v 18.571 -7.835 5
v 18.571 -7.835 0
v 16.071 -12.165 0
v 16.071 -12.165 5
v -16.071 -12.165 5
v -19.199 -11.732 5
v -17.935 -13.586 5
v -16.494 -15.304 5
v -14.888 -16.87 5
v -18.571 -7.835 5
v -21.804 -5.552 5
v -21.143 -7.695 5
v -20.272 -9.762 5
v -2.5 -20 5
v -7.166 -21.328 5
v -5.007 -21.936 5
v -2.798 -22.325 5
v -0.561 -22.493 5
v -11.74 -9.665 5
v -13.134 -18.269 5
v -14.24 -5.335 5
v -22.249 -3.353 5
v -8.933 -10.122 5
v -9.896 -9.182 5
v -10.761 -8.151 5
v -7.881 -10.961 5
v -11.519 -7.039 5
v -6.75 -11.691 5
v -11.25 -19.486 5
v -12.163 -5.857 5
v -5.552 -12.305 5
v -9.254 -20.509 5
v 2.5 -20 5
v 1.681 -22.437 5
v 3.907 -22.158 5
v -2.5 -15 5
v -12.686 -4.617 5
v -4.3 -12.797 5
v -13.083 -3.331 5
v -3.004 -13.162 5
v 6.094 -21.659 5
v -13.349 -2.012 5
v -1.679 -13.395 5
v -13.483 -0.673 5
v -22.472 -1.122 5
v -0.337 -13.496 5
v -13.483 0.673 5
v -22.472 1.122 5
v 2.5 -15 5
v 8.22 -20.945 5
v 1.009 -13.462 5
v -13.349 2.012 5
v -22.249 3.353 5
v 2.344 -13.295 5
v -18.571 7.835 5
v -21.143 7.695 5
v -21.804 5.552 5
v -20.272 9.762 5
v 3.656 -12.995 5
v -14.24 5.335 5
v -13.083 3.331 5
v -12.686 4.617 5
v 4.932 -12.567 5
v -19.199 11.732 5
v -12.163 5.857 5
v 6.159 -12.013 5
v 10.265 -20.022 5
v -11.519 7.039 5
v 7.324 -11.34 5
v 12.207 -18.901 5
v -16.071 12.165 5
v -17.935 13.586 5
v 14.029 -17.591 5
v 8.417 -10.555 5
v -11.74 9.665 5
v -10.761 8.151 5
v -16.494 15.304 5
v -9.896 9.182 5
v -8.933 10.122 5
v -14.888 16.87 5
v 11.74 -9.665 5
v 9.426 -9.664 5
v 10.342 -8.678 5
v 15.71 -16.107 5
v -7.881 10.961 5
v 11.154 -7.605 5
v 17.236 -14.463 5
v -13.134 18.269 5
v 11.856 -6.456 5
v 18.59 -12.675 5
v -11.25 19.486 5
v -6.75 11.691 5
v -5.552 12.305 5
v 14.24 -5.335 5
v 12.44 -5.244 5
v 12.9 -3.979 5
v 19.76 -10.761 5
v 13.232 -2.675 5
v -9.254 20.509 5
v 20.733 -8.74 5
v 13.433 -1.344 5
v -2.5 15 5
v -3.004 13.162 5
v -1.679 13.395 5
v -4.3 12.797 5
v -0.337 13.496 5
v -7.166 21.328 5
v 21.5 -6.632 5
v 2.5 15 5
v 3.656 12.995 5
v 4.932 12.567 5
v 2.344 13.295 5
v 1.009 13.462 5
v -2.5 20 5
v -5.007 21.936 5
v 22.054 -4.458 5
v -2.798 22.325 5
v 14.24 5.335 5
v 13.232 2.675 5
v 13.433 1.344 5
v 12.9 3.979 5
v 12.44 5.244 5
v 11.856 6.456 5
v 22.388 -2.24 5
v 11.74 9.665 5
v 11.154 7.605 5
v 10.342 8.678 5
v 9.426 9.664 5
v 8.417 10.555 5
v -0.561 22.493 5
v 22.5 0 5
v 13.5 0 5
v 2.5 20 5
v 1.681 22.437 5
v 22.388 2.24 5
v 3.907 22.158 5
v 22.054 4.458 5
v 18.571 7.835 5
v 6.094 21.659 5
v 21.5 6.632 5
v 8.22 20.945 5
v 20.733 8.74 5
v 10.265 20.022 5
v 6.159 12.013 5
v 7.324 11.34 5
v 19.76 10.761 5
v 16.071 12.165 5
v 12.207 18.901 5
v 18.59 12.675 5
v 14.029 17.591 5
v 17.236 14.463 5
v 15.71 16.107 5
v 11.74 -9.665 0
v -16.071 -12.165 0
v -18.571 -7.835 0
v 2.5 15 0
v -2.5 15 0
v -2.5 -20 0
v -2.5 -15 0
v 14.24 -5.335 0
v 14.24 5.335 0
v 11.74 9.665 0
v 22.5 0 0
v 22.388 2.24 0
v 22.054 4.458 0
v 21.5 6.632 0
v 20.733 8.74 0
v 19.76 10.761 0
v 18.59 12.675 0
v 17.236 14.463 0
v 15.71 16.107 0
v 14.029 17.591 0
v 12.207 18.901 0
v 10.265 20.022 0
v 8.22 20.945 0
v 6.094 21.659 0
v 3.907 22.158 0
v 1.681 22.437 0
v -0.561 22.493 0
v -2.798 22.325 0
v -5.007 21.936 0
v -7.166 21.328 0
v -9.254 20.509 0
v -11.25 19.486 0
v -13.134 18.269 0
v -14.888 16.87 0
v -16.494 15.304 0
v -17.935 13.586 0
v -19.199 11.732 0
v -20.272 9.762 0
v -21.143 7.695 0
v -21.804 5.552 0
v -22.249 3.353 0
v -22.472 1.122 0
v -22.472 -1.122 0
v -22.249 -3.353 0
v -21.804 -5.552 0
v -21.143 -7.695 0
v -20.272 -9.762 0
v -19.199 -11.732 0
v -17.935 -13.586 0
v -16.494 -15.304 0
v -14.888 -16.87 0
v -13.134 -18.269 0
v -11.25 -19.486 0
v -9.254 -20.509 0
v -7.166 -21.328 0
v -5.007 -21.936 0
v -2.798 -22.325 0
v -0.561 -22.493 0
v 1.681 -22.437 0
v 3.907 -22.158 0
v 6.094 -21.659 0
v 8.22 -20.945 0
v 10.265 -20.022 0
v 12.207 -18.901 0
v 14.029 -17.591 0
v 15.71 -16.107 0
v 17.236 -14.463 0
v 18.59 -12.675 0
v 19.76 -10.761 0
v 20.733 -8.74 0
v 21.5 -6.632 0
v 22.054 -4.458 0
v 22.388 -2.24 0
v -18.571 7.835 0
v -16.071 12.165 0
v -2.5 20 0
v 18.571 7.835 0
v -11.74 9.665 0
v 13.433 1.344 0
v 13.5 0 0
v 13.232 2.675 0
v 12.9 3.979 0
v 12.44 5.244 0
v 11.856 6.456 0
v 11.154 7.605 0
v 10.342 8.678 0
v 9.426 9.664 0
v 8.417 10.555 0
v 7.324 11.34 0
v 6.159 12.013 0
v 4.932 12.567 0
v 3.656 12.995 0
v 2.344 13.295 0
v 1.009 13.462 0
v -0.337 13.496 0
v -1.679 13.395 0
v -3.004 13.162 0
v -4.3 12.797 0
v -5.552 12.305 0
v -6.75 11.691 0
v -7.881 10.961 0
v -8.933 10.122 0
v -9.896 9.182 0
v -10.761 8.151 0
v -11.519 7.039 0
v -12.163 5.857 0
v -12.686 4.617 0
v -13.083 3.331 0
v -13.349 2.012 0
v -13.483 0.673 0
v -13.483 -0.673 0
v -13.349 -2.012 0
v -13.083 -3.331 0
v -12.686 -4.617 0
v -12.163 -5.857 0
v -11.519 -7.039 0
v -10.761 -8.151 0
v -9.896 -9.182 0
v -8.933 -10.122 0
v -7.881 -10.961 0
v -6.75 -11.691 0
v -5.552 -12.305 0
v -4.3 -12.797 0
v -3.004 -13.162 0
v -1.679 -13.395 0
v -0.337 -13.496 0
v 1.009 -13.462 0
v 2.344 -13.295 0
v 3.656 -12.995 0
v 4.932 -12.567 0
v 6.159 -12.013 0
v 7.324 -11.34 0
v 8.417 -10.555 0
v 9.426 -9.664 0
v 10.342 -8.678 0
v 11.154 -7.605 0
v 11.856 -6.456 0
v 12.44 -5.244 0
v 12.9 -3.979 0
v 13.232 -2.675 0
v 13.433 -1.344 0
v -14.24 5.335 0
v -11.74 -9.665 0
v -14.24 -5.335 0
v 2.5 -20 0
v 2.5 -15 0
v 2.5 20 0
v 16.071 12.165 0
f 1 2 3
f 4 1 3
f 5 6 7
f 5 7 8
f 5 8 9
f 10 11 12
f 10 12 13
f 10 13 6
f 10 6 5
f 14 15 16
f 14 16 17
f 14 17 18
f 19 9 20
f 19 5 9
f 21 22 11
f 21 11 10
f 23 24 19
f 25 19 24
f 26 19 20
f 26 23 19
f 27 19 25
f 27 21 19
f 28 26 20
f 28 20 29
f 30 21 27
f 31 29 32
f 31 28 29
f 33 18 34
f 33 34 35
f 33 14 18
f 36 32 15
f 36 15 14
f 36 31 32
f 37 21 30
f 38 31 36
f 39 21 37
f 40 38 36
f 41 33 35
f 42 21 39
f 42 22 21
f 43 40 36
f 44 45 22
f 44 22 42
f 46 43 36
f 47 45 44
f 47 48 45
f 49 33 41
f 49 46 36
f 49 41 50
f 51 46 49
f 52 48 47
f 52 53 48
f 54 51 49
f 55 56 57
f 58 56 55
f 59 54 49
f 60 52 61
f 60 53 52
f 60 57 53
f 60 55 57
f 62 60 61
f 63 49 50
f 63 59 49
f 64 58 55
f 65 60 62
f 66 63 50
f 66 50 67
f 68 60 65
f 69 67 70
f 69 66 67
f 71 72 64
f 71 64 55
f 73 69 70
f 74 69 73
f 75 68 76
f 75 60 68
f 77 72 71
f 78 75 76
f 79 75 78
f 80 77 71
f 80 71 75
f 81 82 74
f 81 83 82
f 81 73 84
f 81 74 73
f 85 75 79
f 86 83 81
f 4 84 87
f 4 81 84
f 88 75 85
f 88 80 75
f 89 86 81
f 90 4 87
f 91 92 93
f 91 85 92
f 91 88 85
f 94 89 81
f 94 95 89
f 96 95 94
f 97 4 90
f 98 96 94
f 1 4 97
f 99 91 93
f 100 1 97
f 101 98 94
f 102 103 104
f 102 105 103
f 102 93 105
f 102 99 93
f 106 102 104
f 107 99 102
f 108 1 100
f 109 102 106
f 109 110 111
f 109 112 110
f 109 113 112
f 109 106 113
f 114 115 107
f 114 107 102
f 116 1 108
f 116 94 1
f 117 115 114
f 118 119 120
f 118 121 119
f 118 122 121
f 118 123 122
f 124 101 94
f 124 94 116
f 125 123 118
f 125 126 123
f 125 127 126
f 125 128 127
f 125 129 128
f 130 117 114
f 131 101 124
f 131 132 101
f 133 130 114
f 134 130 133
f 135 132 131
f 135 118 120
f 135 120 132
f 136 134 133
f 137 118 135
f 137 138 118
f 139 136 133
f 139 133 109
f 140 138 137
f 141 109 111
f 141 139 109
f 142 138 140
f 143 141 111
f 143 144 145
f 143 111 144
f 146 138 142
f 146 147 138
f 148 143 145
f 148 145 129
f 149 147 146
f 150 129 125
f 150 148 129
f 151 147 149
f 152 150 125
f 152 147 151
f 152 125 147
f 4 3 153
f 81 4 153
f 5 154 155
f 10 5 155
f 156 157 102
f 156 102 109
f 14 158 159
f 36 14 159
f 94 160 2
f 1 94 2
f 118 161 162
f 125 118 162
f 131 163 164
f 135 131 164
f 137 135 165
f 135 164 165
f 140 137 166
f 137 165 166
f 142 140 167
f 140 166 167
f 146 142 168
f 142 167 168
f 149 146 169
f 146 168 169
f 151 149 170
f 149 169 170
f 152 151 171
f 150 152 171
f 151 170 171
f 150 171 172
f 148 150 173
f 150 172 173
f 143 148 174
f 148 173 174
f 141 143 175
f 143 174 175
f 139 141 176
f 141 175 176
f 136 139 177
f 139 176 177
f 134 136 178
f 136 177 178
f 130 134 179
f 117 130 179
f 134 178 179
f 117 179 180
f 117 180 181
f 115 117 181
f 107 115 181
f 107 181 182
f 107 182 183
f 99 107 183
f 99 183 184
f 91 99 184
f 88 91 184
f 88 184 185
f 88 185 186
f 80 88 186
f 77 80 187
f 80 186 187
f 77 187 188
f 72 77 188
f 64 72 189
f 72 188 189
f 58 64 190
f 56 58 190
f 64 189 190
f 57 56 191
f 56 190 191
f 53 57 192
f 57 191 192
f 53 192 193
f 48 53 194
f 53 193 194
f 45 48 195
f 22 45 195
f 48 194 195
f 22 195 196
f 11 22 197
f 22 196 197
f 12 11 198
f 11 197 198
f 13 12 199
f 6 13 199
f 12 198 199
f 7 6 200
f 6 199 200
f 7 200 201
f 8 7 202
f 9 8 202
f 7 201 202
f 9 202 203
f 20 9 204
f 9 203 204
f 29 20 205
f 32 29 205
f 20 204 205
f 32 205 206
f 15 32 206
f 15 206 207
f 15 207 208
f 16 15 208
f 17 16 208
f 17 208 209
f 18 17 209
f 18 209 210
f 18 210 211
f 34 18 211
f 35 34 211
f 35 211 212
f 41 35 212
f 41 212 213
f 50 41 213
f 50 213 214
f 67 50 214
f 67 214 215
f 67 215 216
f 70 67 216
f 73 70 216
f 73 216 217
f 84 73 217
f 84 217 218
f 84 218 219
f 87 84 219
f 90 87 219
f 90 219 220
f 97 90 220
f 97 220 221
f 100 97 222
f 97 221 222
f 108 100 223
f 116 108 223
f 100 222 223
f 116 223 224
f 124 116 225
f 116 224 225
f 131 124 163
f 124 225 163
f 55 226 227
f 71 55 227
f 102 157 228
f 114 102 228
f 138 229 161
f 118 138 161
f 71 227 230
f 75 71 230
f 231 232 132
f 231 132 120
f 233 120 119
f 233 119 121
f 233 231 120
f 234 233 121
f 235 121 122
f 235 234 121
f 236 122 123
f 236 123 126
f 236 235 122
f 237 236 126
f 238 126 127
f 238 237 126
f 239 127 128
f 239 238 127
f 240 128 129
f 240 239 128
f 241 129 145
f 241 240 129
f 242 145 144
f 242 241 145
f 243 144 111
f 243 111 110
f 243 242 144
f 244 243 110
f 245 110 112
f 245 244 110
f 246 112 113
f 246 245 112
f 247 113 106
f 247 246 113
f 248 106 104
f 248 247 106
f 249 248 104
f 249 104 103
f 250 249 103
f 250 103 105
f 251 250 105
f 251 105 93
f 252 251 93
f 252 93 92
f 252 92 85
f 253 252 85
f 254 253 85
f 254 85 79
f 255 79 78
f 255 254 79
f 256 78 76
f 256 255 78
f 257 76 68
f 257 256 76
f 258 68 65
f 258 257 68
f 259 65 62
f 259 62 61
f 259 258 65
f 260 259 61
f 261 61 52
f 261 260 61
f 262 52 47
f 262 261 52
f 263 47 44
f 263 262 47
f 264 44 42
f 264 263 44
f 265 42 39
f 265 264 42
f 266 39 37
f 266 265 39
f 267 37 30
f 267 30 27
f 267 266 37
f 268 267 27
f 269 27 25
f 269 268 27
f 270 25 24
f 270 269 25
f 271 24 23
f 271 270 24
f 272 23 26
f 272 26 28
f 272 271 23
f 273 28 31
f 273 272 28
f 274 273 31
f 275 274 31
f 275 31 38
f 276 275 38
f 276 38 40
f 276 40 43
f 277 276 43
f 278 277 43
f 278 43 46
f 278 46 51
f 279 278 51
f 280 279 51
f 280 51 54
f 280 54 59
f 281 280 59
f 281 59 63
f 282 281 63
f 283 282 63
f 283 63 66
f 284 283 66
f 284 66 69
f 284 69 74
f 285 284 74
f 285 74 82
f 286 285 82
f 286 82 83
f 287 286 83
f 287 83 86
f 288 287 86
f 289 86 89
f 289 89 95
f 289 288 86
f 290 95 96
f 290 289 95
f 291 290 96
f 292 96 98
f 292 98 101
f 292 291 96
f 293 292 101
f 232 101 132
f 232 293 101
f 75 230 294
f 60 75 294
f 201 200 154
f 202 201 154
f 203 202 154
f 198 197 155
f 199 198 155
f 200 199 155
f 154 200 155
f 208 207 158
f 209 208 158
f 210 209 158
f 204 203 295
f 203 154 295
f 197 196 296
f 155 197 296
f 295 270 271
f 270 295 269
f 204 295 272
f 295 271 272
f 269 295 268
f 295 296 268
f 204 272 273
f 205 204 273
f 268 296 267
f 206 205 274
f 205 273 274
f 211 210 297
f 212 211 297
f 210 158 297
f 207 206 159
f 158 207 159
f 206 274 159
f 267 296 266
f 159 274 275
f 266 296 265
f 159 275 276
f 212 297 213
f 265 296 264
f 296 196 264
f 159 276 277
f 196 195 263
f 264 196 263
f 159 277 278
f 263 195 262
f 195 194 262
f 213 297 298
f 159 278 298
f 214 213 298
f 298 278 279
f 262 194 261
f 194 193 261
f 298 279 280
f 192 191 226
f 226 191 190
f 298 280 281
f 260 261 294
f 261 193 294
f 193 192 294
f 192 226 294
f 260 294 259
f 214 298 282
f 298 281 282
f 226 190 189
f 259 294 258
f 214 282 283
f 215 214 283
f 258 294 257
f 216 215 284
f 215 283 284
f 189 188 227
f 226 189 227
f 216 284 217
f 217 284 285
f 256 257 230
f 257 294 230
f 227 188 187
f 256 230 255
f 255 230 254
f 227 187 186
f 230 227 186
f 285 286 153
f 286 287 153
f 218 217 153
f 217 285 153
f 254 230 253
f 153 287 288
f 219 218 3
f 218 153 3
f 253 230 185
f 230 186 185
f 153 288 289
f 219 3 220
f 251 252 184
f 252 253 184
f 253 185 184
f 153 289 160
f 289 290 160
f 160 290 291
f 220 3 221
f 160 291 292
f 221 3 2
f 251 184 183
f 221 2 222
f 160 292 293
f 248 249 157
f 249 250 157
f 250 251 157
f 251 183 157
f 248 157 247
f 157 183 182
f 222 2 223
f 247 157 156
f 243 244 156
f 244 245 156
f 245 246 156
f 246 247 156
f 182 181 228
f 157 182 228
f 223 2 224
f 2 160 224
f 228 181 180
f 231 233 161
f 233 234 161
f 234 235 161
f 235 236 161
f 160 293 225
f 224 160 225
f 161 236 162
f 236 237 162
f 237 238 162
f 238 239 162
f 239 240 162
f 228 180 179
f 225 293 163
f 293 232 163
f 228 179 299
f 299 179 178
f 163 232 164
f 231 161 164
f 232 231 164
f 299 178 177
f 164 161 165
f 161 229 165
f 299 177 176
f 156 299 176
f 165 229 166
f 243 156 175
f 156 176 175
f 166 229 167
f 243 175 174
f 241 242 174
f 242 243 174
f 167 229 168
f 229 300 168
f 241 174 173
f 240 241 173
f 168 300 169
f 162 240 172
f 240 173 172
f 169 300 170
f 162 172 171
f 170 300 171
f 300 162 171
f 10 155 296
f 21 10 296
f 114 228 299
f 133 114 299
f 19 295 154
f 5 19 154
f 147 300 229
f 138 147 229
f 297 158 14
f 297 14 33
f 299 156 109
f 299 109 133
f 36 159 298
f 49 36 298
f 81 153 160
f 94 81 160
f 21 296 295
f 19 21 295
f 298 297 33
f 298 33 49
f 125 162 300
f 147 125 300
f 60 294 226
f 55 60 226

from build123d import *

# Parameters (mm, degrees)
SKETCH1_R           = 22.5
SKETCH1_R_2         = 13.5
SKETCH1_W           = 5
SKETCH1_H           = 5
BOSS_EXTRUDE1_DEPTH = 5


with BuildPart() as part:
    # Sketch1 → Boss-Extrude1 (new body)
    with BuildSketch(Plane.XY):
        Circle(SKETCH1_R)
        Circle(SKETCH1_R_2, mode=Mode.SUBTRACT)
        with Locations((0, 17.5)):
            Rectangle(SKETCH1_W, SKETCH1_H, mode=Mode.SUBTRACT)
        Polygon((18.570508076, 7.834936491), (14.240381057, 5.334936491), (11.740381057, 9.665063509), (16.070508076, 12.165063509), align=None, mode=Mode.SUBTRACT)
        Polygon((16.070508076, -12.165063509), (11.740381057, -9.665063509), (14.240381057, -5.334936491), (18.570508076, -7.834936491), align=None, mode=Mode.SUBTRACT)
        with Locations((0, -17.5)):
            Rectangle(SKETCH1_W, SKETCH1_H, mode=Mode.SUBTRACT)
        Polygon((-18.570508076, -7.834936491), (-14.240381057, -5.334936491), (-11.740381057, -9.665063509), (-16.070508076, -12.165063509), align=None, mode=Mode.SUBTRACT)
        Polygon((-16.070508076, 12.165063509), (-11.740381057, 9.665063509), (-14.240381057, 5.334936491), (-18.570508076, 7.834936491), align=None, mode=Mode.SUBTRACT)
    extrude(amount=BOSS_EXTRUDE1_DEPTH)


solid = part.part
